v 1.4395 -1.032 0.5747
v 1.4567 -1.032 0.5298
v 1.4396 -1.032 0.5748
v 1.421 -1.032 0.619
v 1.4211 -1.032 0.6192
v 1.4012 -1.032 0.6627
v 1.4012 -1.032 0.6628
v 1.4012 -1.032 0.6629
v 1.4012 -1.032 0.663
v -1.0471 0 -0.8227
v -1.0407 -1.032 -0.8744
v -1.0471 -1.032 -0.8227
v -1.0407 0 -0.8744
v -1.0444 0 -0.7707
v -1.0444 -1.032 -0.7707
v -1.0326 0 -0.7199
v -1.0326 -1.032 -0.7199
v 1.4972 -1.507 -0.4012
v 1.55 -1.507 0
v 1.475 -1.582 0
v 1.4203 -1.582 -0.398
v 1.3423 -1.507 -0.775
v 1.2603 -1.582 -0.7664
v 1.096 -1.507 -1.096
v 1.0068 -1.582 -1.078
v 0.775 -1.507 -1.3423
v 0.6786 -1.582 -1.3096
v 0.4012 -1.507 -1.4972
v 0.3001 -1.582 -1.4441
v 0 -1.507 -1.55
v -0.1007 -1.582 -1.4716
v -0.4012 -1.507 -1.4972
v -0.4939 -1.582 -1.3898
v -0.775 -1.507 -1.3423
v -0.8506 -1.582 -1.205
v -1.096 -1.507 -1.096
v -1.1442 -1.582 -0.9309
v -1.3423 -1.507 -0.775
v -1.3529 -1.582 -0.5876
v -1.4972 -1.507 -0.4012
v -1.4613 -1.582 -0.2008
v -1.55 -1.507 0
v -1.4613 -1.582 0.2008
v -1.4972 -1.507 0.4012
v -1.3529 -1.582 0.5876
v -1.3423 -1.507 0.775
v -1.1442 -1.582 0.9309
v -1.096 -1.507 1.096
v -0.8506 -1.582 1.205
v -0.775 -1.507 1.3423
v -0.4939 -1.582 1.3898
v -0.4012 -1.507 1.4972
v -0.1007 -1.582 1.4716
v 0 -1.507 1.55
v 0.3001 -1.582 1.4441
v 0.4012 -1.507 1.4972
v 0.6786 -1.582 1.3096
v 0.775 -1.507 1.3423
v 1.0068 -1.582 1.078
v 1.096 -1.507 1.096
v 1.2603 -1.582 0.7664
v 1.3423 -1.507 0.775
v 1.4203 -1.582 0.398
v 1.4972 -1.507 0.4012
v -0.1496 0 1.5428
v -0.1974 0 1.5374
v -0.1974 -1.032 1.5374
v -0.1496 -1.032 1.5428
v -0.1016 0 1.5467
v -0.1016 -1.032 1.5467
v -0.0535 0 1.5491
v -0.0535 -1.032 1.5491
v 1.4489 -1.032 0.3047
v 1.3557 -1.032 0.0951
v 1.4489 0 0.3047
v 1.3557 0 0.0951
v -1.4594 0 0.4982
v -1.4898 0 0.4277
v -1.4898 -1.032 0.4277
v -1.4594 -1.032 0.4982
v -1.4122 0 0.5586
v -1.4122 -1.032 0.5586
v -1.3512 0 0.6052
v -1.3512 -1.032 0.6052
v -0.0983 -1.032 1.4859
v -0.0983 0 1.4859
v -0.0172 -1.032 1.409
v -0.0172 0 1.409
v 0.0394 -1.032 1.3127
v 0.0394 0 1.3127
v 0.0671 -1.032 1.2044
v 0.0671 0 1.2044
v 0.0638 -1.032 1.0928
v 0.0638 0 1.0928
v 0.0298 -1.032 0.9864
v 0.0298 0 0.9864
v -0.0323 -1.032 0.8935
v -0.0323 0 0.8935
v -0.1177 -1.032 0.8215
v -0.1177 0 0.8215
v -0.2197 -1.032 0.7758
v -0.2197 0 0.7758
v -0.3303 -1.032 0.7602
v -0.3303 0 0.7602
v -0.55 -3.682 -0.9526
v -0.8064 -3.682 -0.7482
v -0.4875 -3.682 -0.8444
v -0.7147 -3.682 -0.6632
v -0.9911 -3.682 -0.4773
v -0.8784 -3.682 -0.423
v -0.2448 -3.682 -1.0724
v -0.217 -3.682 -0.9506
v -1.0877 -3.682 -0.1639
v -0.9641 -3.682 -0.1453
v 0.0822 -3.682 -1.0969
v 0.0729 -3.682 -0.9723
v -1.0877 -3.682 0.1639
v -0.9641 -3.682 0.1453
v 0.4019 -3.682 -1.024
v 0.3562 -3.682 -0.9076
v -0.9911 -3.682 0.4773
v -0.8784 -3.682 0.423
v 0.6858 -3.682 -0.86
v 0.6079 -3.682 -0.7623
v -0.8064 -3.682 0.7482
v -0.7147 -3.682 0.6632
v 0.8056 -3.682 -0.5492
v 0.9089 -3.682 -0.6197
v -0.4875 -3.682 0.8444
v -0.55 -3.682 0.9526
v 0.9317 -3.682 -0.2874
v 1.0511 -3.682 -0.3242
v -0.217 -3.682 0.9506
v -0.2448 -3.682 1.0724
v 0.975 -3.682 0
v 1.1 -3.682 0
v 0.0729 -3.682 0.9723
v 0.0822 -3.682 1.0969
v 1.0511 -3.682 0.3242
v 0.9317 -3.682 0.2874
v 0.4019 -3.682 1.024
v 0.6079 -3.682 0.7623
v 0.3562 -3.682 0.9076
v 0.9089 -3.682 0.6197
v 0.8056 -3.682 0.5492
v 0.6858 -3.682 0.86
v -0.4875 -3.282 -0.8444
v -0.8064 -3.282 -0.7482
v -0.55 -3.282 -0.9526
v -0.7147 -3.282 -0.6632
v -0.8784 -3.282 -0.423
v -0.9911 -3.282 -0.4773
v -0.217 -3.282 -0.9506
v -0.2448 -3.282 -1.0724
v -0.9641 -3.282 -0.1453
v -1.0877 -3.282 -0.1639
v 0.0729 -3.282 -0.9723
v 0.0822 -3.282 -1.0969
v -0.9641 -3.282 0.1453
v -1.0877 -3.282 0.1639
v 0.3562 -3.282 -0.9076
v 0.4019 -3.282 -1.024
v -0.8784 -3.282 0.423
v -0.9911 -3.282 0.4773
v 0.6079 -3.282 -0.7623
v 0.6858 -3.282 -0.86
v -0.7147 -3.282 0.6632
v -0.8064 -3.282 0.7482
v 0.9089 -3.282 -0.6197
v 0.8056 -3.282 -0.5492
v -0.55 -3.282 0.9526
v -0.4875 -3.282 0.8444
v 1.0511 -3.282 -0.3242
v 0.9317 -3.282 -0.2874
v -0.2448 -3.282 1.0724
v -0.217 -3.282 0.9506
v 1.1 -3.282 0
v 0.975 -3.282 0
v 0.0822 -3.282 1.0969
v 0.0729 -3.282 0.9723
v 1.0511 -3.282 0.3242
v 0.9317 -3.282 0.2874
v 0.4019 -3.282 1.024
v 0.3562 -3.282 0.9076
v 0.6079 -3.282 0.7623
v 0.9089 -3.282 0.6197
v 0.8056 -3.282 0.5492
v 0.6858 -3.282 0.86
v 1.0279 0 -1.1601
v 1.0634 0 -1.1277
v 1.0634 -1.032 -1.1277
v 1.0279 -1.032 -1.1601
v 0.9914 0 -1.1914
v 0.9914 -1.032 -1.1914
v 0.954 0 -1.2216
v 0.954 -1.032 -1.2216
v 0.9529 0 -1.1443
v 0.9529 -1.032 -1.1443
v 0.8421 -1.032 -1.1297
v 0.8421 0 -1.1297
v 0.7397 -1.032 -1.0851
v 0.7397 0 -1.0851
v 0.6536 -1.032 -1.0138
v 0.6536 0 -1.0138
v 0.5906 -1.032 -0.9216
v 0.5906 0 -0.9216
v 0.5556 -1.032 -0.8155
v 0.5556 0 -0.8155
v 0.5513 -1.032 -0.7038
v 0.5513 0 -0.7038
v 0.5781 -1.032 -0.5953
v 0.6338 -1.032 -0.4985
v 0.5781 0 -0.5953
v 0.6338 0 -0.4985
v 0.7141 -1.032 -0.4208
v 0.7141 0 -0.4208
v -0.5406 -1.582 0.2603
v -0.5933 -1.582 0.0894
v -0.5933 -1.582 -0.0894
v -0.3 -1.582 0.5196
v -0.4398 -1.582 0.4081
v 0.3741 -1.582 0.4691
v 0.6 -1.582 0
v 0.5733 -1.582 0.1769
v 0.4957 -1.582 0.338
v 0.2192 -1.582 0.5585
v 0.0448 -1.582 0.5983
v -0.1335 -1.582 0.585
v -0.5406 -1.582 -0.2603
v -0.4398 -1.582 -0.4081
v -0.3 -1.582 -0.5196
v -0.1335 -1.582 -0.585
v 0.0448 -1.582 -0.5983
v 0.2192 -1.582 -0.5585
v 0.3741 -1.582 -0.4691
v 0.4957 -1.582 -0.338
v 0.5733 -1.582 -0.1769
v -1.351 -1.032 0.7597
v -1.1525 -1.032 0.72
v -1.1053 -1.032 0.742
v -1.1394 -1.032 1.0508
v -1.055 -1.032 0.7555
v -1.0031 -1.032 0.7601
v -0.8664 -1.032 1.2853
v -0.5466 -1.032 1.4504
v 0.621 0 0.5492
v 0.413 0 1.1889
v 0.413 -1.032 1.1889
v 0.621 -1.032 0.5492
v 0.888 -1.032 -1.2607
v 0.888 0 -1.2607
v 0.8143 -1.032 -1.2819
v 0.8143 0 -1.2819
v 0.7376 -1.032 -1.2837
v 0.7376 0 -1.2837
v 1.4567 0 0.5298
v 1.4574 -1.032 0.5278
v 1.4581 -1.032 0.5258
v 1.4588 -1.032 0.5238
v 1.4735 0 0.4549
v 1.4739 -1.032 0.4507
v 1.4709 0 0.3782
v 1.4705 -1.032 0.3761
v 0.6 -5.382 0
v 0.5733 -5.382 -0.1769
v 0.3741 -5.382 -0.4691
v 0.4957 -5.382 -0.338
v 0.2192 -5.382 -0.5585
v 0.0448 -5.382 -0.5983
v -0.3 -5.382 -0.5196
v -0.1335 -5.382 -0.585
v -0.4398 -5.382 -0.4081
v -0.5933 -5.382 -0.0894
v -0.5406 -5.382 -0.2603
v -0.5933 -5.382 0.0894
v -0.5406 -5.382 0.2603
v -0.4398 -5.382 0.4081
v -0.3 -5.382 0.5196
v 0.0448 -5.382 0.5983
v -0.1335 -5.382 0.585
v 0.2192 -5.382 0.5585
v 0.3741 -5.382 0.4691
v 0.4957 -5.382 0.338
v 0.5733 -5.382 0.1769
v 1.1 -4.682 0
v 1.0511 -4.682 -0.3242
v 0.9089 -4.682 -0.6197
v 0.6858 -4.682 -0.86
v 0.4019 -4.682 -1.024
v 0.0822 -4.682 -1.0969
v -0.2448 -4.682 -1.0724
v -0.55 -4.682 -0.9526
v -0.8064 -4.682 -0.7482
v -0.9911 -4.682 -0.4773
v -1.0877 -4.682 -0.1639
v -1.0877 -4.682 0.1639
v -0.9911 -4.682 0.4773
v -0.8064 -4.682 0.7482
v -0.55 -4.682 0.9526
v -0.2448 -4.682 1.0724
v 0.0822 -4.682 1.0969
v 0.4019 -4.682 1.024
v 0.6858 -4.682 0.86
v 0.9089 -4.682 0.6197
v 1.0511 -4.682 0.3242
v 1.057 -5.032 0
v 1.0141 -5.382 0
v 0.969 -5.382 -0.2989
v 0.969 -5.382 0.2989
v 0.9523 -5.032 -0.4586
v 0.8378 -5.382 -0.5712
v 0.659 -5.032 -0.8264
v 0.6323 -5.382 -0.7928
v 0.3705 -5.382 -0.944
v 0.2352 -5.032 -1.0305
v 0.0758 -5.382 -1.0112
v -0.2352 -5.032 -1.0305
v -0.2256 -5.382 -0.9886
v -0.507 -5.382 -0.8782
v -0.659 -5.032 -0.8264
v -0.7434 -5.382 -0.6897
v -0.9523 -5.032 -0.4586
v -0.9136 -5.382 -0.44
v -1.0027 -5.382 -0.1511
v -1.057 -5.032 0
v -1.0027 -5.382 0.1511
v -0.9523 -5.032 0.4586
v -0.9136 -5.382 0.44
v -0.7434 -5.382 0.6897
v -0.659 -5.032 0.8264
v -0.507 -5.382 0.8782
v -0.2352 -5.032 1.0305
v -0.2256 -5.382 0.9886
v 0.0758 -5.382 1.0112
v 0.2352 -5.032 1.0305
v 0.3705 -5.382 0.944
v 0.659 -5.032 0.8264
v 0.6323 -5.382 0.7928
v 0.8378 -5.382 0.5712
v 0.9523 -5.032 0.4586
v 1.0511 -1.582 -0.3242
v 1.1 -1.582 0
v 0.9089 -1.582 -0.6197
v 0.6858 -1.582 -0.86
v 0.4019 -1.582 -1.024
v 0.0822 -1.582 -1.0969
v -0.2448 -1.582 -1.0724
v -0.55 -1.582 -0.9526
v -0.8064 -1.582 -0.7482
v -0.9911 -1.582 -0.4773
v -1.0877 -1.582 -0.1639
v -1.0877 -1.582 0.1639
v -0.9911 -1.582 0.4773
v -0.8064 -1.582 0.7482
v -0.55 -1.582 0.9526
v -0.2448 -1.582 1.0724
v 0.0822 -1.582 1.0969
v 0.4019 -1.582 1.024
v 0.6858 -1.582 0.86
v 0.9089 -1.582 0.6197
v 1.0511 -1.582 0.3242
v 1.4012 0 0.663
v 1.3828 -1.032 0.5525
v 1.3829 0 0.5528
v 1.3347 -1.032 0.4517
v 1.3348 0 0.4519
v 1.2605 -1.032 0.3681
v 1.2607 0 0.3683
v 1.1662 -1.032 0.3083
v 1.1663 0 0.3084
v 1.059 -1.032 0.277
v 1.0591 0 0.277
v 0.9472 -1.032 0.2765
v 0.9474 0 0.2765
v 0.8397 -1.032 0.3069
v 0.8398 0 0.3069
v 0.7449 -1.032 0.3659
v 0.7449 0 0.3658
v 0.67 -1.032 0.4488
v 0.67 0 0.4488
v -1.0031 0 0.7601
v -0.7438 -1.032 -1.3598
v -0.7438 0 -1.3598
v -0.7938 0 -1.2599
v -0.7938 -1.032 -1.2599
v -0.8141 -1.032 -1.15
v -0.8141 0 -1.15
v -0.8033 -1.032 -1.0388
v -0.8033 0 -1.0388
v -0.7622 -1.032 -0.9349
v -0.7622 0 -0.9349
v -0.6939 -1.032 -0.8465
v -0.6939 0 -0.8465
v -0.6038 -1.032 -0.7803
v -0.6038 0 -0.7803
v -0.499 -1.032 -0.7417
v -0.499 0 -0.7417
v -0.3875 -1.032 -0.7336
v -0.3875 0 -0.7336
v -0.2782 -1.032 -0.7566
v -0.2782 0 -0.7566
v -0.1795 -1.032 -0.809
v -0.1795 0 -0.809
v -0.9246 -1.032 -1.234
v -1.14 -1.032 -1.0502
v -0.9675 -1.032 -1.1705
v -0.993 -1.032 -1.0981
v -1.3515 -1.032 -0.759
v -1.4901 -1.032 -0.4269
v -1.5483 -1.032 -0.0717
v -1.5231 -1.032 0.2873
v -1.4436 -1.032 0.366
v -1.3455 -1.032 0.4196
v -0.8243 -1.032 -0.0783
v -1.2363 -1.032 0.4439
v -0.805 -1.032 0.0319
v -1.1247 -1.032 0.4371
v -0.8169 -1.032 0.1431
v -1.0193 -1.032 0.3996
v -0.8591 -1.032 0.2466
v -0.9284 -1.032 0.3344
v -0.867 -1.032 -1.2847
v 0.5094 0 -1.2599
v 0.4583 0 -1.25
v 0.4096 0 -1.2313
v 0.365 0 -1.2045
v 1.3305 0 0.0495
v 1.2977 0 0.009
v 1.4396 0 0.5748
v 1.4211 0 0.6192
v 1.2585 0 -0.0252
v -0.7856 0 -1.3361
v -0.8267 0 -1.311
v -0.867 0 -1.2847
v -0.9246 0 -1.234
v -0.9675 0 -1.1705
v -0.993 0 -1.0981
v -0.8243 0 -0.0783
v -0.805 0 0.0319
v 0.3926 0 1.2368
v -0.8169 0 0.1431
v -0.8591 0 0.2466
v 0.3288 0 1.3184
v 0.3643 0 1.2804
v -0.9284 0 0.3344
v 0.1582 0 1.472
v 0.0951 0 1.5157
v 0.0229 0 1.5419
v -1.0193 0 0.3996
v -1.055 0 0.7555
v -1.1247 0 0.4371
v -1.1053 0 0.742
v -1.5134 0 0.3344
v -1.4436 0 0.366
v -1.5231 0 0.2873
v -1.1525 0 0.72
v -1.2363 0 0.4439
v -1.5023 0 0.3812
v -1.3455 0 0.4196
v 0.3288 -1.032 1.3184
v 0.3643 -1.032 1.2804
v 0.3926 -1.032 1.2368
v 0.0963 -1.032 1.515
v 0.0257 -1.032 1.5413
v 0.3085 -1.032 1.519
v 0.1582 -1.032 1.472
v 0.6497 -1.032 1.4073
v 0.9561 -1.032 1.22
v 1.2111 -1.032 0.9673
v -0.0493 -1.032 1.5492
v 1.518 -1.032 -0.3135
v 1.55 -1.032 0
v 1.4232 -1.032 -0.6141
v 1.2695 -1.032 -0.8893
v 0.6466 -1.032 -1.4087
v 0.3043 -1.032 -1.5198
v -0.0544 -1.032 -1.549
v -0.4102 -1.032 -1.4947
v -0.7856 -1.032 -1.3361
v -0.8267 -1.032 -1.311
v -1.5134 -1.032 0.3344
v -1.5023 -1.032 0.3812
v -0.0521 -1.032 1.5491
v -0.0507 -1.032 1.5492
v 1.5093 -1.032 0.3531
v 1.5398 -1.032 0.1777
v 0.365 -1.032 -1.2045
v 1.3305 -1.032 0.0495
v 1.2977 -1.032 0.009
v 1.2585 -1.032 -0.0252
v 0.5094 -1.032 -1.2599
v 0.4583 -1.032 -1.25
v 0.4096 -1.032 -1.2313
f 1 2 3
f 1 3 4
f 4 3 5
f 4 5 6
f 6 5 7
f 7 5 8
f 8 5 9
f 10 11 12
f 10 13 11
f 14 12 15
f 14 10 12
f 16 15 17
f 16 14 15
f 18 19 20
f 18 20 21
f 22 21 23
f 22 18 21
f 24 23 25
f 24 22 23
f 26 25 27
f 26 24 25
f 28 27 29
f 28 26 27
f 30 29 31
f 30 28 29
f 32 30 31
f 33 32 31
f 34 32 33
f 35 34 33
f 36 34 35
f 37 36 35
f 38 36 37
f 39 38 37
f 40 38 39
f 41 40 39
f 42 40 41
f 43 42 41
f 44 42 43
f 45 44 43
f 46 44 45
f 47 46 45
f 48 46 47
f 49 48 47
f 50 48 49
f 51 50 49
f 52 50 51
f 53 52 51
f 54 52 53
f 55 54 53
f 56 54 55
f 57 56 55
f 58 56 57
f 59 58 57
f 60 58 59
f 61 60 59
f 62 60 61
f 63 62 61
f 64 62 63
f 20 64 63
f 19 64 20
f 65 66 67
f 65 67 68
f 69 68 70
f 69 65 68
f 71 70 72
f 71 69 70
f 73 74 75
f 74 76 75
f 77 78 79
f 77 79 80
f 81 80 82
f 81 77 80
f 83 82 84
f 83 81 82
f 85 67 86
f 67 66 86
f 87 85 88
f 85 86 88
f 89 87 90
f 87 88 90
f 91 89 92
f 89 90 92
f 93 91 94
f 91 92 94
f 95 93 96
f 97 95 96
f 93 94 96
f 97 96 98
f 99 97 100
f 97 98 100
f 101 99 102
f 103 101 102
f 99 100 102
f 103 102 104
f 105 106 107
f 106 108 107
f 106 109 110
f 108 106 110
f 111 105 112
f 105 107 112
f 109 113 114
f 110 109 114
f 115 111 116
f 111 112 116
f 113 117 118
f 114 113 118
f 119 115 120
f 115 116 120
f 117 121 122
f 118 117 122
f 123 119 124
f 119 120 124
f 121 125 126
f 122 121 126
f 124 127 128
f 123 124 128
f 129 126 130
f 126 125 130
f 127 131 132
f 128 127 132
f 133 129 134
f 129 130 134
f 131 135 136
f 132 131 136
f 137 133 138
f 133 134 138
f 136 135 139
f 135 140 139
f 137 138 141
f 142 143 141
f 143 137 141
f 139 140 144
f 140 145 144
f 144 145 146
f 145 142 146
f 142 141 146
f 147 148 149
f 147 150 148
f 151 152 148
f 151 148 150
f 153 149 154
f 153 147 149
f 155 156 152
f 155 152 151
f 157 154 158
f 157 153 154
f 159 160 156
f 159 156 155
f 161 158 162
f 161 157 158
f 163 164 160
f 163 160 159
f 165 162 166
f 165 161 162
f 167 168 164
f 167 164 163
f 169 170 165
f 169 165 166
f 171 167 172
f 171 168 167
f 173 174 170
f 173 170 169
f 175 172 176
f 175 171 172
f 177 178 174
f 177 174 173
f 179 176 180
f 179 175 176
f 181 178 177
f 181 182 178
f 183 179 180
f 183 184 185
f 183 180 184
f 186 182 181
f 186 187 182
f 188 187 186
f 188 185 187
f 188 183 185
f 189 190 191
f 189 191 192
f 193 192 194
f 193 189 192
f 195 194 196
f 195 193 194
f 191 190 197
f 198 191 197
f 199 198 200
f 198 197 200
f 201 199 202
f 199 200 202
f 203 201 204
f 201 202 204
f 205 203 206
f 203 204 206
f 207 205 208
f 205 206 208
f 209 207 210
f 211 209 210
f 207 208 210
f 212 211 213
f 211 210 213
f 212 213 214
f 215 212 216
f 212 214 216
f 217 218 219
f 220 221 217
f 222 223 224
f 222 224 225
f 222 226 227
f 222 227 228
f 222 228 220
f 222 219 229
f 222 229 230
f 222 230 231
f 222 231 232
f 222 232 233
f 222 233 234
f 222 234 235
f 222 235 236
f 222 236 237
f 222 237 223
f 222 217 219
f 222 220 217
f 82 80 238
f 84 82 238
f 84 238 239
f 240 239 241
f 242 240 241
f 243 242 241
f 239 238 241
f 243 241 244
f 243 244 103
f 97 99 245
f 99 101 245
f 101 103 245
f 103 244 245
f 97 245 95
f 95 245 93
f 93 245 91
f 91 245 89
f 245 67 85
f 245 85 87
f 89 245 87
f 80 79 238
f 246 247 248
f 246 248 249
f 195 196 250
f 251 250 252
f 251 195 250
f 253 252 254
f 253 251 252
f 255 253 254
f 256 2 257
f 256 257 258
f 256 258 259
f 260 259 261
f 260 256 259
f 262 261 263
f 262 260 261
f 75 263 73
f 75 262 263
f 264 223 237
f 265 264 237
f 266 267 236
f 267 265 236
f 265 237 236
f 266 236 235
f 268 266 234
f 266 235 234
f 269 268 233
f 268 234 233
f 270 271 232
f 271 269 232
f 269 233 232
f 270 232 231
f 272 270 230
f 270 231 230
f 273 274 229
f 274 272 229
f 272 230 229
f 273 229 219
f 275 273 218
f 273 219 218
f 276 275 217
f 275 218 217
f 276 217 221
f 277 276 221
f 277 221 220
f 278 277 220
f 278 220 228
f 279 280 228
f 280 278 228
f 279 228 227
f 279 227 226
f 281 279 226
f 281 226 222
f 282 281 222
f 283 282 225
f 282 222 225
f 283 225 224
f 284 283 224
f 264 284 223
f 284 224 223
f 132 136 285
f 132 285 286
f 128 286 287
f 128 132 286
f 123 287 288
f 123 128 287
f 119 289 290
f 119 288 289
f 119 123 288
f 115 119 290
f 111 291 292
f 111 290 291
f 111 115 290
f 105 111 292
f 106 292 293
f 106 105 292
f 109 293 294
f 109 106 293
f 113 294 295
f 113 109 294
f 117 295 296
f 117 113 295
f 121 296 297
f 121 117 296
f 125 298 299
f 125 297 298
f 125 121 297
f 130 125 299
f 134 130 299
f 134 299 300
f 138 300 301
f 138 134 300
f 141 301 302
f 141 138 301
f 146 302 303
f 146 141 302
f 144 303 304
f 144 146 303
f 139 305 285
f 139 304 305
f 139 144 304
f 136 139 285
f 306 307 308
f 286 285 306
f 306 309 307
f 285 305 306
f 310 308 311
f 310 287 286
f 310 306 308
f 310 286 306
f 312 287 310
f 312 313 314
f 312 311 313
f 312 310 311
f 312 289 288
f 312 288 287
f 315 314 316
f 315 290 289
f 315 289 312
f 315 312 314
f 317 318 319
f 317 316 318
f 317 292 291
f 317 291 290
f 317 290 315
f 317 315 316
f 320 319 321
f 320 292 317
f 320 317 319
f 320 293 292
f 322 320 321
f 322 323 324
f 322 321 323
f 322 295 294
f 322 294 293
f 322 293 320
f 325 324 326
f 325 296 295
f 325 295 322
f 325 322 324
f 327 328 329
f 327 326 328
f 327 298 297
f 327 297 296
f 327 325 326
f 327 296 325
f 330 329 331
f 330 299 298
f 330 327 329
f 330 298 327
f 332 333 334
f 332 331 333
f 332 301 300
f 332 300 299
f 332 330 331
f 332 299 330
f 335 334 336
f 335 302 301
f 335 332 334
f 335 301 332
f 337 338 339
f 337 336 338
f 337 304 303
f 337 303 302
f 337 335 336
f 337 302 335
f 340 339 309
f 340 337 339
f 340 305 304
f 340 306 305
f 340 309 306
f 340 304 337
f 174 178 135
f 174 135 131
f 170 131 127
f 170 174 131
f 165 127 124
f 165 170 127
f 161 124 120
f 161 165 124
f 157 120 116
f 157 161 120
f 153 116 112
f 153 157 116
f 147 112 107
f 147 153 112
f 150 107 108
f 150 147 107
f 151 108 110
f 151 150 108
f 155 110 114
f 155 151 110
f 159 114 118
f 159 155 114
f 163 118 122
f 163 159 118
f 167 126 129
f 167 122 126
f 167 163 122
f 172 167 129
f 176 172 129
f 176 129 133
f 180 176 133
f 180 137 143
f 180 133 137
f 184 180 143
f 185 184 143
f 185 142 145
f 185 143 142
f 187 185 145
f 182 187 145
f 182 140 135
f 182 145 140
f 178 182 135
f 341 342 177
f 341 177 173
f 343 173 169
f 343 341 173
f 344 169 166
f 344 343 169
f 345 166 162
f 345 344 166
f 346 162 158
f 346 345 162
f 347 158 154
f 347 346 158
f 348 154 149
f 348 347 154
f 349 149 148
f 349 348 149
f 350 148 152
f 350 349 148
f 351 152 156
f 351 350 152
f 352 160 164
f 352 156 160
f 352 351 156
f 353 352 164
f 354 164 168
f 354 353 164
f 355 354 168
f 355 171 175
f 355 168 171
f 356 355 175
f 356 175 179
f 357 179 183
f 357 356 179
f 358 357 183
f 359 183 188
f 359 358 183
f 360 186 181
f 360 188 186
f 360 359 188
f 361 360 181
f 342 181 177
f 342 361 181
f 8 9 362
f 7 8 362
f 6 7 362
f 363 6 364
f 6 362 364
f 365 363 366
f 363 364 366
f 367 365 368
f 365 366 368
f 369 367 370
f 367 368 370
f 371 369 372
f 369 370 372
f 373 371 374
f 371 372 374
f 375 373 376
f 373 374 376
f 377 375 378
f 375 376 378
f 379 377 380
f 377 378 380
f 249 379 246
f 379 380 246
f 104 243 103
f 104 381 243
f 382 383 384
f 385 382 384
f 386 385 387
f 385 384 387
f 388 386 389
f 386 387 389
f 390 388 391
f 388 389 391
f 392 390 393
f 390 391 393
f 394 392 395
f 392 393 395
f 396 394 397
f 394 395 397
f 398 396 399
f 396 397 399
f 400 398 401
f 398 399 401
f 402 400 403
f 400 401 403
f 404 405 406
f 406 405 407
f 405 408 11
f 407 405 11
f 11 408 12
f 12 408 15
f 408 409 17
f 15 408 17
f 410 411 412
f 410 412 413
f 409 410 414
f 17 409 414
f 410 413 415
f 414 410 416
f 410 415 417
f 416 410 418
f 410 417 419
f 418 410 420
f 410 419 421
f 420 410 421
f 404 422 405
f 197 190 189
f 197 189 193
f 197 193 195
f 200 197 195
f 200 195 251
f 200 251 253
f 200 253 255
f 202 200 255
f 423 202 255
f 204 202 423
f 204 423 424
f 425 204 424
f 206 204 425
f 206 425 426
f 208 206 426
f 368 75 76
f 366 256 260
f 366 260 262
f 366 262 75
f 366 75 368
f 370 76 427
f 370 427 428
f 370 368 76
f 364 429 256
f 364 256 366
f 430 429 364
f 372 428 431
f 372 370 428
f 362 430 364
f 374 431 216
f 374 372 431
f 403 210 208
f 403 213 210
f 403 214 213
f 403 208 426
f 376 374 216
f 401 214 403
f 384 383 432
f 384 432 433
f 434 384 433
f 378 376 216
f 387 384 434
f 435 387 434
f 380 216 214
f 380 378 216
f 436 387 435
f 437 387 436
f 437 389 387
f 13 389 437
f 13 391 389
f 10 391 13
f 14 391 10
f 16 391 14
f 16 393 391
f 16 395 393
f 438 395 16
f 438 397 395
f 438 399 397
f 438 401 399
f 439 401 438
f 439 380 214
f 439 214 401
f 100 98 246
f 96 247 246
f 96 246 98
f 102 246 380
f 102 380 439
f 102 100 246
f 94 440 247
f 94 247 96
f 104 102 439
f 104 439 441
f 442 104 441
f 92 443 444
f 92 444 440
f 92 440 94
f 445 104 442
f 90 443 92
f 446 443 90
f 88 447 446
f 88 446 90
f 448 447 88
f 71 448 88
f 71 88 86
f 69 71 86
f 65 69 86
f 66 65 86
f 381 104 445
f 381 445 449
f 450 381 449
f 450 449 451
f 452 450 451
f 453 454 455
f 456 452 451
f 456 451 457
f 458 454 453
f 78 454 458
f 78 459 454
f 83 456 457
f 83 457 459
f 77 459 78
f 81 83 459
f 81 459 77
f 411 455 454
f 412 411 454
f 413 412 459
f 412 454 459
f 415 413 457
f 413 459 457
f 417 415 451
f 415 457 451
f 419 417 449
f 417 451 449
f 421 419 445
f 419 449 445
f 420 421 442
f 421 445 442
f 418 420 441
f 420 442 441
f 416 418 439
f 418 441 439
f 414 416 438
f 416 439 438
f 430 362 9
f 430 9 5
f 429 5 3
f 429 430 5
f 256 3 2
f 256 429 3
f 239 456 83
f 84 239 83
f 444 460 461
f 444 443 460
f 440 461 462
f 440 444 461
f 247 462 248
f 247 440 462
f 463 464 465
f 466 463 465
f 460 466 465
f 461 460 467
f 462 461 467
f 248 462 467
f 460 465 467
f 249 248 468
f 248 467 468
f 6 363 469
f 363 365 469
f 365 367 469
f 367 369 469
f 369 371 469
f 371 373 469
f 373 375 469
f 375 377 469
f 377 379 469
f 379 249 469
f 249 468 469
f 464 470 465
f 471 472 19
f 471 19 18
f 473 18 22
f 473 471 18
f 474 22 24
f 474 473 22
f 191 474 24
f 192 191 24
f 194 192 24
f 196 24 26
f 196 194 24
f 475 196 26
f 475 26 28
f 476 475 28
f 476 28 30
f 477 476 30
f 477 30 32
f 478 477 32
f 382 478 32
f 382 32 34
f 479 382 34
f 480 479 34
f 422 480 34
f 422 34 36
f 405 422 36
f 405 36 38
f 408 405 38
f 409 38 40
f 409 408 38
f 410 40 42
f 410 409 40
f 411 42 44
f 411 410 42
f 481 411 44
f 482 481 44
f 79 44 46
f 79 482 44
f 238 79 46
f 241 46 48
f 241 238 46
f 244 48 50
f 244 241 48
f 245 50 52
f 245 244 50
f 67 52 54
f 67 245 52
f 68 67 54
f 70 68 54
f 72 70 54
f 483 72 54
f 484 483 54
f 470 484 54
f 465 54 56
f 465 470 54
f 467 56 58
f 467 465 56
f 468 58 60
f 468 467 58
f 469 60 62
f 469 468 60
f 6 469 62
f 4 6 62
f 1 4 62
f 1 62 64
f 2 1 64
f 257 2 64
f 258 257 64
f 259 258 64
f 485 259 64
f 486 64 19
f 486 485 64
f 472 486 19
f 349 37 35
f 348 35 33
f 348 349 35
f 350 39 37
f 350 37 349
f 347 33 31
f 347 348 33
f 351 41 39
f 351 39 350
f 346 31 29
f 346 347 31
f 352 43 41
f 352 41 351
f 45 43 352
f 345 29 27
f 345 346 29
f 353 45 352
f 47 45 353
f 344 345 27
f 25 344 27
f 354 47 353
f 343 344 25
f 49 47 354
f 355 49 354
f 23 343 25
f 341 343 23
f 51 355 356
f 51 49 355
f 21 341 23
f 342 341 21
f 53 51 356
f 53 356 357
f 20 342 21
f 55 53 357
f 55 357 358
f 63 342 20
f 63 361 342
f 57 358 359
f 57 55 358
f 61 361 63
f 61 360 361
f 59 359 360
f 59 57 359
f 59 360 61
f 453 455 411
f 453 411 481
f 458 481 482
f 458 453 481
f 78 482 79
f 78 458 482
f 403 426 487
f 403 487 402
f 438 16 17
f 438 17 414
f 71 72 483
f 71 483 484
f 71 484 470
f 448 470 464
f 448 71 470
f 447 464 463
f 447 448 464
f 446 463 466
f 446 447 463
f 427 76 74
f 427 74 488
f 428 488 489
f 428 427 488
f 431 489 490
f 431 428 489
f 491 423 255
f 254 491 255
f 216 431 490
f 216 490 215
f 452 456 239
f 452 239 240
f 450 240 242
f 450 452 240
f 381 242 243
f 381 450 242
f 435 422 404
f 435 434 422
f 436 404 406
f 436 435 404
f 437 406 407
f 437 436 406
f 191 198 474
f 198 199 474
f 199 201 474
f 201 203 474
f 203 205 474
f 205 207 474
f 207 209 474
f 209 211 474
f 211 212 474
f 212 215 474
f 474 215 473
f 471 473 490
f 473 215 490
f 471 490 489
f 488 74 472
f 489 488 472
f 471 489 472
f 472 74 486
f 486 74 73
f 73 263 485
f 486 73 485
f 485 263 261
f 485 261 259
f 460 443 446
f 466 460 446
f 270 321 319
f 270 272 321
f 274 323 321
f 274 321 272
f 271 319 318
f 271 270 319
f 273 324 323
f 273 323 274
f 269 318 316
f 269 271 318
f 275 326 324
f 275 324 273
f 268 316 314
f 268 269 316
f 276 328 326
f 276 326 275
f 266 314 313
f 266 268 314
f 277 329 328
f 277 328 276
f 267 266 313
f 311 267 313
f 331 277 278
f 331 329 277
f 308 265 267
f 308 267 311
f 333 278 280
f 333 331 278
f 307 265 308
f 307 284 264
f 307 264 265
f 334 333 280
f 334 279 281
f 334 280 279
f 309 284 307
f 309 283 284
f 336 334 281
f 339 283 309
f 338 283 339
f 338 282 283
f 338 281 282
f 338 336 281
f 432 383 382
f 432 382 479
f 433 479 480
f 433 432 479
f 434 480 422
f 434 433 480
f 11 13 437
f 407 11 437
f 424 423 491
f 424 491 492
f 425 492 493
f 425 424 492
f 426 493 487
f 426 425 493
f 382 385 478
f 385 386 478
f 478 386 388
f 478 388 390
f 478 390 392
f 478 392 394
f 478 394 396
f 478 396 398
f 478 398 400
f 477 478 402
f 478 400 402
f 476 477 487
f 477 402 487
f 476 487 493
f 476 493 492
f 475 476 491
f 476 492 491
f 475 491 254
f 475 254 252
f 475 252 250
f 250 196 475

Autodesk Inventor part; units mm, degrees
ref_plane "YZ Plane" through (0, 0, 0) normal (1, 0, 0) x (0, 1, 0)
sketch "Sketch2" plane through (0, 0, 0) normal (0, 1, 0) x (-1, 0, 0)
  line L0 (-0.3288, 1.3184) -> (-0.1582, 1.472)
  line L1 (-0.3288, 1.3184) -> (-0.1582, 1.472)
  line L2 (-0.5094, -1.2599) -> (-0.7376, -1.2837)
  arc A0 (0.7438, -1.3598) -> (0.1795, -0.809) centre (0.4146, -1.1327) ccw
  line L3 (-0.365, -1.2045) -> (0.1795, -0.809)
  arc A1 (-1.0634, -1.1277) -> (-0.954, -1.2216) centre (-0.0001, 0.0001) ccw
  line L4 (-0.365, -1.2045) -> (0.1795, -0.809)
  arc A2 (-0.5094, -1.2599) -> (-0.365, -1.2045) centre (-0.5404, -0.963) ccw
  line L5 (1.1525, 0.72) -> (1.3512, 0.6052)
  arc A3 (0.1974, 1.5374) -> (0.3303, 0.7602) centre (0.3304, 1.1602) ccw
  line L6 (1.0031, 0.7601) -> (0.3303, 0.7602)
  arc A4 (1.1525, 0.72) -> (1.0031, 0.7601) centre (1.0031, 0.4616) ccw
  line L7 (1.0407, -0.8744) -> (0.993, -1.0981)
  arc A5 (1.5231, 0.2873) -> (0.8243, -0.0783) centre (1.2047, 0.0452) ccw
  line L8 (1.0326, -0.7199) -> (0.8243, -0.0783)
  arc A6 (1.0407, -0.8744) -> (1.0326, -0.7199) centre (0.7487, -0.8121) ccw
  arc A7 (-1.4012, 0.663) -> (-0.621, 0.5492) centre (-1.0013, 0.6728) ccw
  line L9 (-0.413, 1.1889) -> (-0.621, 0.5492)
  arc A8 (-0.3288, 1.3184) -> (-0.413, 1.1889) centre (-0.1291, 1.0966) ccw
  line L10 (-1.3557, 0.0951) -> (-1.4489, 0.3047)
  arc A9 (-1.0634, -1.1277) -> (-0.7141, -0.4208) centre (-0.9492, -0.7444) ccw
  line L11 (-1.2585, -0.0252) -> (-0.7141, -0.4208)
  arc A10 (-1.3557, 0.0951) -> (-1.2585, -0.0252) centre (-1.083, 0.2163) ccw
  arc A11 (1.5231, 0.2872) -> (1.4898, 0.4277) centre (-0.0001, 0.0001) ccw
  arc A12 (-1.4012, 0.663) -> (-1.4567, 0.5298) centre (-0.0001, 0.0001) ccw
  arc A13 (0.7438, -1.3598) -> (0.867, -1.2847) centre (-0.0001, 0.0001) ccw
  arc A14 (0.1974, 1.5374) -> (0.0535, 1.5491) centre (-0.0001, 0.0001) ccw
  arc A15 (0.0535, 1.5491) -> (-0.1582, 1.472) centre (0.0431, 1.2484) ccw
  arc A16 (-1.4567, 0.5298) -> (-1.4489, 0.3047) centre (-1.174, 0.4269) ccw
  arc A17 (1.4898, 0.4277) -> (1.3512, 0.6052) centre (1.2005, 0.3447) ccw
  arc A18 (-0.954, -1.2216) -> (-0.7376, -1.2837) centre (-0.7688, -0.9844) ccw
  arc A19 (0.867, -1.2847) -> (0.993, -1.0981) centre (0.6987, -1.0353) ccw
  circle A20 centre (-0.0001, 0.0001) radius 1.55
  point P0 (-1.356, 0.0956)
  point P1 (1.0033, 0.76)
  point P2 (0.3301, 0.76)
  dimension "d305" = 3.1
sketch "Sketch3" plane through (0, 0, 0) normal (0, 1, 0) x (-1, 0, 0)
  line L0 (5.0133, 39.043) -> (38.6813, 7.297)
  line L1 (38.6813, 7.297) -> (18.893, -34.5332)
  line L2 (18.893, -34.5332) -> (-27.0048, -28.6397)
  line L3 (-27.0048, -28.6397) -> (-35.5829, 16.8329)
  line L4 (-35.5829, 16.8329) -> (5.0133, 39.043)
  circle A0 centre (0, 0) radius 39.3635
  circle A1 centre (0, 0) radius 20.4353
  circle A2 centre (0, 0) radius 31.8458
  circle A3 centre (10.4717, -28.7325) radius 10.093
  circle A4 centre (41.1153, -0.5956) radius 4.0726
  circle A5 centre (8.144, 29.3283) radius 10.0252
  circle A6 centre (-25.3778, 16.9956) radius 10.0583
  circle A7 centre (-24.1576, -18.872) radius 10.1582
  line L5 (-25.3778, 16.9956) -> (8.3216, 29.3877)
  line L6 (8.3216, 29.3877) -> (30.5209, 1.1669)
  line L7 (30.5209, 1.1669) -> (10.5413, -28.6665)
  line L8 (10.5413, -28.6665) -> (-24.006, -18.8838)
  line L9 (-24.006, -18.8838) -> (-25.3778, 16.9956)
  line L10 (-31.306, -23.8626) -> (-32.3687, 22.3998)
  line L11 (-32.3687, 22.3998) -> (11.301, 37.7064)
  line L12 (11.301, 37.7064) -> (39.3531, 0.904)
  line L13 (39.3531, 0.904) -> (13.0206, -37.1477)
  line L14 (13.0206, -37.1477) -> (-31.306, -23.8626)
  point P0 (-9.1427, -30.5051)
extrude "Extrusion4" add sketch "Sketch2" against normal blind 1.032 contours L0 A15 A14 A3 L6 A4 L5 A17 A11 A5 L8 A6 L7 A19 A13 A0 L3 A2 L2 A18 A1 A9 L11 A10 L10 A16 A12 A7 L9 A8
sketch "Sketch6" plane through (0, -1.032, 0) normal (0, -1, 0) x (1, 0, 0)
  circle A0 centre (0, 0) radius 1.55
  dimension "d304" = 3.1
extrude "Extrusion5" add sketch "Sketch6" along normal blind 0.55
ref_plane "Plan de construction1" through (0, -1.582, 0) normal (0, -1, 0) x (1, 0, 0)
sketch "Sketch7" plane through (0, -1.582, 0) normal (0, -1, 0) x (1, 0, 0)
  circle A0 centre (0, 0) radius 1.1
  circle A1 centre (0, 0) radius 0.6
  circle A2 centre (0, 0) radius 0.975
  dimension "d303" = 2.2
  dimension "d306" = 1.2
  dimension "d307" = 1.95
extrude "Extrusion6" add sketch "Sketch7" along normal blind 3.8 contours A0 | A2
ref_plane "Plan de construction2" through (0, -3.282, 0) normal (0, -1, 0) x (1, 0, 0)
extrude "Extrusion7" cut sketch "Sketch7" along normal blind 0.4 from surface at 1.7 contours A0
chamfer "Chanfrein2" distance 0.7 angle 7 1 edges at (-1.1, -5.382, 0) measured on face at (1.0964, -4.8153, -0.0885)
chamfer "Chanfrein3" distance 0.075 angle 45 1 edges at (-1.55, -1.582, 0)
properties part number "3.2mm_uncorrected"
